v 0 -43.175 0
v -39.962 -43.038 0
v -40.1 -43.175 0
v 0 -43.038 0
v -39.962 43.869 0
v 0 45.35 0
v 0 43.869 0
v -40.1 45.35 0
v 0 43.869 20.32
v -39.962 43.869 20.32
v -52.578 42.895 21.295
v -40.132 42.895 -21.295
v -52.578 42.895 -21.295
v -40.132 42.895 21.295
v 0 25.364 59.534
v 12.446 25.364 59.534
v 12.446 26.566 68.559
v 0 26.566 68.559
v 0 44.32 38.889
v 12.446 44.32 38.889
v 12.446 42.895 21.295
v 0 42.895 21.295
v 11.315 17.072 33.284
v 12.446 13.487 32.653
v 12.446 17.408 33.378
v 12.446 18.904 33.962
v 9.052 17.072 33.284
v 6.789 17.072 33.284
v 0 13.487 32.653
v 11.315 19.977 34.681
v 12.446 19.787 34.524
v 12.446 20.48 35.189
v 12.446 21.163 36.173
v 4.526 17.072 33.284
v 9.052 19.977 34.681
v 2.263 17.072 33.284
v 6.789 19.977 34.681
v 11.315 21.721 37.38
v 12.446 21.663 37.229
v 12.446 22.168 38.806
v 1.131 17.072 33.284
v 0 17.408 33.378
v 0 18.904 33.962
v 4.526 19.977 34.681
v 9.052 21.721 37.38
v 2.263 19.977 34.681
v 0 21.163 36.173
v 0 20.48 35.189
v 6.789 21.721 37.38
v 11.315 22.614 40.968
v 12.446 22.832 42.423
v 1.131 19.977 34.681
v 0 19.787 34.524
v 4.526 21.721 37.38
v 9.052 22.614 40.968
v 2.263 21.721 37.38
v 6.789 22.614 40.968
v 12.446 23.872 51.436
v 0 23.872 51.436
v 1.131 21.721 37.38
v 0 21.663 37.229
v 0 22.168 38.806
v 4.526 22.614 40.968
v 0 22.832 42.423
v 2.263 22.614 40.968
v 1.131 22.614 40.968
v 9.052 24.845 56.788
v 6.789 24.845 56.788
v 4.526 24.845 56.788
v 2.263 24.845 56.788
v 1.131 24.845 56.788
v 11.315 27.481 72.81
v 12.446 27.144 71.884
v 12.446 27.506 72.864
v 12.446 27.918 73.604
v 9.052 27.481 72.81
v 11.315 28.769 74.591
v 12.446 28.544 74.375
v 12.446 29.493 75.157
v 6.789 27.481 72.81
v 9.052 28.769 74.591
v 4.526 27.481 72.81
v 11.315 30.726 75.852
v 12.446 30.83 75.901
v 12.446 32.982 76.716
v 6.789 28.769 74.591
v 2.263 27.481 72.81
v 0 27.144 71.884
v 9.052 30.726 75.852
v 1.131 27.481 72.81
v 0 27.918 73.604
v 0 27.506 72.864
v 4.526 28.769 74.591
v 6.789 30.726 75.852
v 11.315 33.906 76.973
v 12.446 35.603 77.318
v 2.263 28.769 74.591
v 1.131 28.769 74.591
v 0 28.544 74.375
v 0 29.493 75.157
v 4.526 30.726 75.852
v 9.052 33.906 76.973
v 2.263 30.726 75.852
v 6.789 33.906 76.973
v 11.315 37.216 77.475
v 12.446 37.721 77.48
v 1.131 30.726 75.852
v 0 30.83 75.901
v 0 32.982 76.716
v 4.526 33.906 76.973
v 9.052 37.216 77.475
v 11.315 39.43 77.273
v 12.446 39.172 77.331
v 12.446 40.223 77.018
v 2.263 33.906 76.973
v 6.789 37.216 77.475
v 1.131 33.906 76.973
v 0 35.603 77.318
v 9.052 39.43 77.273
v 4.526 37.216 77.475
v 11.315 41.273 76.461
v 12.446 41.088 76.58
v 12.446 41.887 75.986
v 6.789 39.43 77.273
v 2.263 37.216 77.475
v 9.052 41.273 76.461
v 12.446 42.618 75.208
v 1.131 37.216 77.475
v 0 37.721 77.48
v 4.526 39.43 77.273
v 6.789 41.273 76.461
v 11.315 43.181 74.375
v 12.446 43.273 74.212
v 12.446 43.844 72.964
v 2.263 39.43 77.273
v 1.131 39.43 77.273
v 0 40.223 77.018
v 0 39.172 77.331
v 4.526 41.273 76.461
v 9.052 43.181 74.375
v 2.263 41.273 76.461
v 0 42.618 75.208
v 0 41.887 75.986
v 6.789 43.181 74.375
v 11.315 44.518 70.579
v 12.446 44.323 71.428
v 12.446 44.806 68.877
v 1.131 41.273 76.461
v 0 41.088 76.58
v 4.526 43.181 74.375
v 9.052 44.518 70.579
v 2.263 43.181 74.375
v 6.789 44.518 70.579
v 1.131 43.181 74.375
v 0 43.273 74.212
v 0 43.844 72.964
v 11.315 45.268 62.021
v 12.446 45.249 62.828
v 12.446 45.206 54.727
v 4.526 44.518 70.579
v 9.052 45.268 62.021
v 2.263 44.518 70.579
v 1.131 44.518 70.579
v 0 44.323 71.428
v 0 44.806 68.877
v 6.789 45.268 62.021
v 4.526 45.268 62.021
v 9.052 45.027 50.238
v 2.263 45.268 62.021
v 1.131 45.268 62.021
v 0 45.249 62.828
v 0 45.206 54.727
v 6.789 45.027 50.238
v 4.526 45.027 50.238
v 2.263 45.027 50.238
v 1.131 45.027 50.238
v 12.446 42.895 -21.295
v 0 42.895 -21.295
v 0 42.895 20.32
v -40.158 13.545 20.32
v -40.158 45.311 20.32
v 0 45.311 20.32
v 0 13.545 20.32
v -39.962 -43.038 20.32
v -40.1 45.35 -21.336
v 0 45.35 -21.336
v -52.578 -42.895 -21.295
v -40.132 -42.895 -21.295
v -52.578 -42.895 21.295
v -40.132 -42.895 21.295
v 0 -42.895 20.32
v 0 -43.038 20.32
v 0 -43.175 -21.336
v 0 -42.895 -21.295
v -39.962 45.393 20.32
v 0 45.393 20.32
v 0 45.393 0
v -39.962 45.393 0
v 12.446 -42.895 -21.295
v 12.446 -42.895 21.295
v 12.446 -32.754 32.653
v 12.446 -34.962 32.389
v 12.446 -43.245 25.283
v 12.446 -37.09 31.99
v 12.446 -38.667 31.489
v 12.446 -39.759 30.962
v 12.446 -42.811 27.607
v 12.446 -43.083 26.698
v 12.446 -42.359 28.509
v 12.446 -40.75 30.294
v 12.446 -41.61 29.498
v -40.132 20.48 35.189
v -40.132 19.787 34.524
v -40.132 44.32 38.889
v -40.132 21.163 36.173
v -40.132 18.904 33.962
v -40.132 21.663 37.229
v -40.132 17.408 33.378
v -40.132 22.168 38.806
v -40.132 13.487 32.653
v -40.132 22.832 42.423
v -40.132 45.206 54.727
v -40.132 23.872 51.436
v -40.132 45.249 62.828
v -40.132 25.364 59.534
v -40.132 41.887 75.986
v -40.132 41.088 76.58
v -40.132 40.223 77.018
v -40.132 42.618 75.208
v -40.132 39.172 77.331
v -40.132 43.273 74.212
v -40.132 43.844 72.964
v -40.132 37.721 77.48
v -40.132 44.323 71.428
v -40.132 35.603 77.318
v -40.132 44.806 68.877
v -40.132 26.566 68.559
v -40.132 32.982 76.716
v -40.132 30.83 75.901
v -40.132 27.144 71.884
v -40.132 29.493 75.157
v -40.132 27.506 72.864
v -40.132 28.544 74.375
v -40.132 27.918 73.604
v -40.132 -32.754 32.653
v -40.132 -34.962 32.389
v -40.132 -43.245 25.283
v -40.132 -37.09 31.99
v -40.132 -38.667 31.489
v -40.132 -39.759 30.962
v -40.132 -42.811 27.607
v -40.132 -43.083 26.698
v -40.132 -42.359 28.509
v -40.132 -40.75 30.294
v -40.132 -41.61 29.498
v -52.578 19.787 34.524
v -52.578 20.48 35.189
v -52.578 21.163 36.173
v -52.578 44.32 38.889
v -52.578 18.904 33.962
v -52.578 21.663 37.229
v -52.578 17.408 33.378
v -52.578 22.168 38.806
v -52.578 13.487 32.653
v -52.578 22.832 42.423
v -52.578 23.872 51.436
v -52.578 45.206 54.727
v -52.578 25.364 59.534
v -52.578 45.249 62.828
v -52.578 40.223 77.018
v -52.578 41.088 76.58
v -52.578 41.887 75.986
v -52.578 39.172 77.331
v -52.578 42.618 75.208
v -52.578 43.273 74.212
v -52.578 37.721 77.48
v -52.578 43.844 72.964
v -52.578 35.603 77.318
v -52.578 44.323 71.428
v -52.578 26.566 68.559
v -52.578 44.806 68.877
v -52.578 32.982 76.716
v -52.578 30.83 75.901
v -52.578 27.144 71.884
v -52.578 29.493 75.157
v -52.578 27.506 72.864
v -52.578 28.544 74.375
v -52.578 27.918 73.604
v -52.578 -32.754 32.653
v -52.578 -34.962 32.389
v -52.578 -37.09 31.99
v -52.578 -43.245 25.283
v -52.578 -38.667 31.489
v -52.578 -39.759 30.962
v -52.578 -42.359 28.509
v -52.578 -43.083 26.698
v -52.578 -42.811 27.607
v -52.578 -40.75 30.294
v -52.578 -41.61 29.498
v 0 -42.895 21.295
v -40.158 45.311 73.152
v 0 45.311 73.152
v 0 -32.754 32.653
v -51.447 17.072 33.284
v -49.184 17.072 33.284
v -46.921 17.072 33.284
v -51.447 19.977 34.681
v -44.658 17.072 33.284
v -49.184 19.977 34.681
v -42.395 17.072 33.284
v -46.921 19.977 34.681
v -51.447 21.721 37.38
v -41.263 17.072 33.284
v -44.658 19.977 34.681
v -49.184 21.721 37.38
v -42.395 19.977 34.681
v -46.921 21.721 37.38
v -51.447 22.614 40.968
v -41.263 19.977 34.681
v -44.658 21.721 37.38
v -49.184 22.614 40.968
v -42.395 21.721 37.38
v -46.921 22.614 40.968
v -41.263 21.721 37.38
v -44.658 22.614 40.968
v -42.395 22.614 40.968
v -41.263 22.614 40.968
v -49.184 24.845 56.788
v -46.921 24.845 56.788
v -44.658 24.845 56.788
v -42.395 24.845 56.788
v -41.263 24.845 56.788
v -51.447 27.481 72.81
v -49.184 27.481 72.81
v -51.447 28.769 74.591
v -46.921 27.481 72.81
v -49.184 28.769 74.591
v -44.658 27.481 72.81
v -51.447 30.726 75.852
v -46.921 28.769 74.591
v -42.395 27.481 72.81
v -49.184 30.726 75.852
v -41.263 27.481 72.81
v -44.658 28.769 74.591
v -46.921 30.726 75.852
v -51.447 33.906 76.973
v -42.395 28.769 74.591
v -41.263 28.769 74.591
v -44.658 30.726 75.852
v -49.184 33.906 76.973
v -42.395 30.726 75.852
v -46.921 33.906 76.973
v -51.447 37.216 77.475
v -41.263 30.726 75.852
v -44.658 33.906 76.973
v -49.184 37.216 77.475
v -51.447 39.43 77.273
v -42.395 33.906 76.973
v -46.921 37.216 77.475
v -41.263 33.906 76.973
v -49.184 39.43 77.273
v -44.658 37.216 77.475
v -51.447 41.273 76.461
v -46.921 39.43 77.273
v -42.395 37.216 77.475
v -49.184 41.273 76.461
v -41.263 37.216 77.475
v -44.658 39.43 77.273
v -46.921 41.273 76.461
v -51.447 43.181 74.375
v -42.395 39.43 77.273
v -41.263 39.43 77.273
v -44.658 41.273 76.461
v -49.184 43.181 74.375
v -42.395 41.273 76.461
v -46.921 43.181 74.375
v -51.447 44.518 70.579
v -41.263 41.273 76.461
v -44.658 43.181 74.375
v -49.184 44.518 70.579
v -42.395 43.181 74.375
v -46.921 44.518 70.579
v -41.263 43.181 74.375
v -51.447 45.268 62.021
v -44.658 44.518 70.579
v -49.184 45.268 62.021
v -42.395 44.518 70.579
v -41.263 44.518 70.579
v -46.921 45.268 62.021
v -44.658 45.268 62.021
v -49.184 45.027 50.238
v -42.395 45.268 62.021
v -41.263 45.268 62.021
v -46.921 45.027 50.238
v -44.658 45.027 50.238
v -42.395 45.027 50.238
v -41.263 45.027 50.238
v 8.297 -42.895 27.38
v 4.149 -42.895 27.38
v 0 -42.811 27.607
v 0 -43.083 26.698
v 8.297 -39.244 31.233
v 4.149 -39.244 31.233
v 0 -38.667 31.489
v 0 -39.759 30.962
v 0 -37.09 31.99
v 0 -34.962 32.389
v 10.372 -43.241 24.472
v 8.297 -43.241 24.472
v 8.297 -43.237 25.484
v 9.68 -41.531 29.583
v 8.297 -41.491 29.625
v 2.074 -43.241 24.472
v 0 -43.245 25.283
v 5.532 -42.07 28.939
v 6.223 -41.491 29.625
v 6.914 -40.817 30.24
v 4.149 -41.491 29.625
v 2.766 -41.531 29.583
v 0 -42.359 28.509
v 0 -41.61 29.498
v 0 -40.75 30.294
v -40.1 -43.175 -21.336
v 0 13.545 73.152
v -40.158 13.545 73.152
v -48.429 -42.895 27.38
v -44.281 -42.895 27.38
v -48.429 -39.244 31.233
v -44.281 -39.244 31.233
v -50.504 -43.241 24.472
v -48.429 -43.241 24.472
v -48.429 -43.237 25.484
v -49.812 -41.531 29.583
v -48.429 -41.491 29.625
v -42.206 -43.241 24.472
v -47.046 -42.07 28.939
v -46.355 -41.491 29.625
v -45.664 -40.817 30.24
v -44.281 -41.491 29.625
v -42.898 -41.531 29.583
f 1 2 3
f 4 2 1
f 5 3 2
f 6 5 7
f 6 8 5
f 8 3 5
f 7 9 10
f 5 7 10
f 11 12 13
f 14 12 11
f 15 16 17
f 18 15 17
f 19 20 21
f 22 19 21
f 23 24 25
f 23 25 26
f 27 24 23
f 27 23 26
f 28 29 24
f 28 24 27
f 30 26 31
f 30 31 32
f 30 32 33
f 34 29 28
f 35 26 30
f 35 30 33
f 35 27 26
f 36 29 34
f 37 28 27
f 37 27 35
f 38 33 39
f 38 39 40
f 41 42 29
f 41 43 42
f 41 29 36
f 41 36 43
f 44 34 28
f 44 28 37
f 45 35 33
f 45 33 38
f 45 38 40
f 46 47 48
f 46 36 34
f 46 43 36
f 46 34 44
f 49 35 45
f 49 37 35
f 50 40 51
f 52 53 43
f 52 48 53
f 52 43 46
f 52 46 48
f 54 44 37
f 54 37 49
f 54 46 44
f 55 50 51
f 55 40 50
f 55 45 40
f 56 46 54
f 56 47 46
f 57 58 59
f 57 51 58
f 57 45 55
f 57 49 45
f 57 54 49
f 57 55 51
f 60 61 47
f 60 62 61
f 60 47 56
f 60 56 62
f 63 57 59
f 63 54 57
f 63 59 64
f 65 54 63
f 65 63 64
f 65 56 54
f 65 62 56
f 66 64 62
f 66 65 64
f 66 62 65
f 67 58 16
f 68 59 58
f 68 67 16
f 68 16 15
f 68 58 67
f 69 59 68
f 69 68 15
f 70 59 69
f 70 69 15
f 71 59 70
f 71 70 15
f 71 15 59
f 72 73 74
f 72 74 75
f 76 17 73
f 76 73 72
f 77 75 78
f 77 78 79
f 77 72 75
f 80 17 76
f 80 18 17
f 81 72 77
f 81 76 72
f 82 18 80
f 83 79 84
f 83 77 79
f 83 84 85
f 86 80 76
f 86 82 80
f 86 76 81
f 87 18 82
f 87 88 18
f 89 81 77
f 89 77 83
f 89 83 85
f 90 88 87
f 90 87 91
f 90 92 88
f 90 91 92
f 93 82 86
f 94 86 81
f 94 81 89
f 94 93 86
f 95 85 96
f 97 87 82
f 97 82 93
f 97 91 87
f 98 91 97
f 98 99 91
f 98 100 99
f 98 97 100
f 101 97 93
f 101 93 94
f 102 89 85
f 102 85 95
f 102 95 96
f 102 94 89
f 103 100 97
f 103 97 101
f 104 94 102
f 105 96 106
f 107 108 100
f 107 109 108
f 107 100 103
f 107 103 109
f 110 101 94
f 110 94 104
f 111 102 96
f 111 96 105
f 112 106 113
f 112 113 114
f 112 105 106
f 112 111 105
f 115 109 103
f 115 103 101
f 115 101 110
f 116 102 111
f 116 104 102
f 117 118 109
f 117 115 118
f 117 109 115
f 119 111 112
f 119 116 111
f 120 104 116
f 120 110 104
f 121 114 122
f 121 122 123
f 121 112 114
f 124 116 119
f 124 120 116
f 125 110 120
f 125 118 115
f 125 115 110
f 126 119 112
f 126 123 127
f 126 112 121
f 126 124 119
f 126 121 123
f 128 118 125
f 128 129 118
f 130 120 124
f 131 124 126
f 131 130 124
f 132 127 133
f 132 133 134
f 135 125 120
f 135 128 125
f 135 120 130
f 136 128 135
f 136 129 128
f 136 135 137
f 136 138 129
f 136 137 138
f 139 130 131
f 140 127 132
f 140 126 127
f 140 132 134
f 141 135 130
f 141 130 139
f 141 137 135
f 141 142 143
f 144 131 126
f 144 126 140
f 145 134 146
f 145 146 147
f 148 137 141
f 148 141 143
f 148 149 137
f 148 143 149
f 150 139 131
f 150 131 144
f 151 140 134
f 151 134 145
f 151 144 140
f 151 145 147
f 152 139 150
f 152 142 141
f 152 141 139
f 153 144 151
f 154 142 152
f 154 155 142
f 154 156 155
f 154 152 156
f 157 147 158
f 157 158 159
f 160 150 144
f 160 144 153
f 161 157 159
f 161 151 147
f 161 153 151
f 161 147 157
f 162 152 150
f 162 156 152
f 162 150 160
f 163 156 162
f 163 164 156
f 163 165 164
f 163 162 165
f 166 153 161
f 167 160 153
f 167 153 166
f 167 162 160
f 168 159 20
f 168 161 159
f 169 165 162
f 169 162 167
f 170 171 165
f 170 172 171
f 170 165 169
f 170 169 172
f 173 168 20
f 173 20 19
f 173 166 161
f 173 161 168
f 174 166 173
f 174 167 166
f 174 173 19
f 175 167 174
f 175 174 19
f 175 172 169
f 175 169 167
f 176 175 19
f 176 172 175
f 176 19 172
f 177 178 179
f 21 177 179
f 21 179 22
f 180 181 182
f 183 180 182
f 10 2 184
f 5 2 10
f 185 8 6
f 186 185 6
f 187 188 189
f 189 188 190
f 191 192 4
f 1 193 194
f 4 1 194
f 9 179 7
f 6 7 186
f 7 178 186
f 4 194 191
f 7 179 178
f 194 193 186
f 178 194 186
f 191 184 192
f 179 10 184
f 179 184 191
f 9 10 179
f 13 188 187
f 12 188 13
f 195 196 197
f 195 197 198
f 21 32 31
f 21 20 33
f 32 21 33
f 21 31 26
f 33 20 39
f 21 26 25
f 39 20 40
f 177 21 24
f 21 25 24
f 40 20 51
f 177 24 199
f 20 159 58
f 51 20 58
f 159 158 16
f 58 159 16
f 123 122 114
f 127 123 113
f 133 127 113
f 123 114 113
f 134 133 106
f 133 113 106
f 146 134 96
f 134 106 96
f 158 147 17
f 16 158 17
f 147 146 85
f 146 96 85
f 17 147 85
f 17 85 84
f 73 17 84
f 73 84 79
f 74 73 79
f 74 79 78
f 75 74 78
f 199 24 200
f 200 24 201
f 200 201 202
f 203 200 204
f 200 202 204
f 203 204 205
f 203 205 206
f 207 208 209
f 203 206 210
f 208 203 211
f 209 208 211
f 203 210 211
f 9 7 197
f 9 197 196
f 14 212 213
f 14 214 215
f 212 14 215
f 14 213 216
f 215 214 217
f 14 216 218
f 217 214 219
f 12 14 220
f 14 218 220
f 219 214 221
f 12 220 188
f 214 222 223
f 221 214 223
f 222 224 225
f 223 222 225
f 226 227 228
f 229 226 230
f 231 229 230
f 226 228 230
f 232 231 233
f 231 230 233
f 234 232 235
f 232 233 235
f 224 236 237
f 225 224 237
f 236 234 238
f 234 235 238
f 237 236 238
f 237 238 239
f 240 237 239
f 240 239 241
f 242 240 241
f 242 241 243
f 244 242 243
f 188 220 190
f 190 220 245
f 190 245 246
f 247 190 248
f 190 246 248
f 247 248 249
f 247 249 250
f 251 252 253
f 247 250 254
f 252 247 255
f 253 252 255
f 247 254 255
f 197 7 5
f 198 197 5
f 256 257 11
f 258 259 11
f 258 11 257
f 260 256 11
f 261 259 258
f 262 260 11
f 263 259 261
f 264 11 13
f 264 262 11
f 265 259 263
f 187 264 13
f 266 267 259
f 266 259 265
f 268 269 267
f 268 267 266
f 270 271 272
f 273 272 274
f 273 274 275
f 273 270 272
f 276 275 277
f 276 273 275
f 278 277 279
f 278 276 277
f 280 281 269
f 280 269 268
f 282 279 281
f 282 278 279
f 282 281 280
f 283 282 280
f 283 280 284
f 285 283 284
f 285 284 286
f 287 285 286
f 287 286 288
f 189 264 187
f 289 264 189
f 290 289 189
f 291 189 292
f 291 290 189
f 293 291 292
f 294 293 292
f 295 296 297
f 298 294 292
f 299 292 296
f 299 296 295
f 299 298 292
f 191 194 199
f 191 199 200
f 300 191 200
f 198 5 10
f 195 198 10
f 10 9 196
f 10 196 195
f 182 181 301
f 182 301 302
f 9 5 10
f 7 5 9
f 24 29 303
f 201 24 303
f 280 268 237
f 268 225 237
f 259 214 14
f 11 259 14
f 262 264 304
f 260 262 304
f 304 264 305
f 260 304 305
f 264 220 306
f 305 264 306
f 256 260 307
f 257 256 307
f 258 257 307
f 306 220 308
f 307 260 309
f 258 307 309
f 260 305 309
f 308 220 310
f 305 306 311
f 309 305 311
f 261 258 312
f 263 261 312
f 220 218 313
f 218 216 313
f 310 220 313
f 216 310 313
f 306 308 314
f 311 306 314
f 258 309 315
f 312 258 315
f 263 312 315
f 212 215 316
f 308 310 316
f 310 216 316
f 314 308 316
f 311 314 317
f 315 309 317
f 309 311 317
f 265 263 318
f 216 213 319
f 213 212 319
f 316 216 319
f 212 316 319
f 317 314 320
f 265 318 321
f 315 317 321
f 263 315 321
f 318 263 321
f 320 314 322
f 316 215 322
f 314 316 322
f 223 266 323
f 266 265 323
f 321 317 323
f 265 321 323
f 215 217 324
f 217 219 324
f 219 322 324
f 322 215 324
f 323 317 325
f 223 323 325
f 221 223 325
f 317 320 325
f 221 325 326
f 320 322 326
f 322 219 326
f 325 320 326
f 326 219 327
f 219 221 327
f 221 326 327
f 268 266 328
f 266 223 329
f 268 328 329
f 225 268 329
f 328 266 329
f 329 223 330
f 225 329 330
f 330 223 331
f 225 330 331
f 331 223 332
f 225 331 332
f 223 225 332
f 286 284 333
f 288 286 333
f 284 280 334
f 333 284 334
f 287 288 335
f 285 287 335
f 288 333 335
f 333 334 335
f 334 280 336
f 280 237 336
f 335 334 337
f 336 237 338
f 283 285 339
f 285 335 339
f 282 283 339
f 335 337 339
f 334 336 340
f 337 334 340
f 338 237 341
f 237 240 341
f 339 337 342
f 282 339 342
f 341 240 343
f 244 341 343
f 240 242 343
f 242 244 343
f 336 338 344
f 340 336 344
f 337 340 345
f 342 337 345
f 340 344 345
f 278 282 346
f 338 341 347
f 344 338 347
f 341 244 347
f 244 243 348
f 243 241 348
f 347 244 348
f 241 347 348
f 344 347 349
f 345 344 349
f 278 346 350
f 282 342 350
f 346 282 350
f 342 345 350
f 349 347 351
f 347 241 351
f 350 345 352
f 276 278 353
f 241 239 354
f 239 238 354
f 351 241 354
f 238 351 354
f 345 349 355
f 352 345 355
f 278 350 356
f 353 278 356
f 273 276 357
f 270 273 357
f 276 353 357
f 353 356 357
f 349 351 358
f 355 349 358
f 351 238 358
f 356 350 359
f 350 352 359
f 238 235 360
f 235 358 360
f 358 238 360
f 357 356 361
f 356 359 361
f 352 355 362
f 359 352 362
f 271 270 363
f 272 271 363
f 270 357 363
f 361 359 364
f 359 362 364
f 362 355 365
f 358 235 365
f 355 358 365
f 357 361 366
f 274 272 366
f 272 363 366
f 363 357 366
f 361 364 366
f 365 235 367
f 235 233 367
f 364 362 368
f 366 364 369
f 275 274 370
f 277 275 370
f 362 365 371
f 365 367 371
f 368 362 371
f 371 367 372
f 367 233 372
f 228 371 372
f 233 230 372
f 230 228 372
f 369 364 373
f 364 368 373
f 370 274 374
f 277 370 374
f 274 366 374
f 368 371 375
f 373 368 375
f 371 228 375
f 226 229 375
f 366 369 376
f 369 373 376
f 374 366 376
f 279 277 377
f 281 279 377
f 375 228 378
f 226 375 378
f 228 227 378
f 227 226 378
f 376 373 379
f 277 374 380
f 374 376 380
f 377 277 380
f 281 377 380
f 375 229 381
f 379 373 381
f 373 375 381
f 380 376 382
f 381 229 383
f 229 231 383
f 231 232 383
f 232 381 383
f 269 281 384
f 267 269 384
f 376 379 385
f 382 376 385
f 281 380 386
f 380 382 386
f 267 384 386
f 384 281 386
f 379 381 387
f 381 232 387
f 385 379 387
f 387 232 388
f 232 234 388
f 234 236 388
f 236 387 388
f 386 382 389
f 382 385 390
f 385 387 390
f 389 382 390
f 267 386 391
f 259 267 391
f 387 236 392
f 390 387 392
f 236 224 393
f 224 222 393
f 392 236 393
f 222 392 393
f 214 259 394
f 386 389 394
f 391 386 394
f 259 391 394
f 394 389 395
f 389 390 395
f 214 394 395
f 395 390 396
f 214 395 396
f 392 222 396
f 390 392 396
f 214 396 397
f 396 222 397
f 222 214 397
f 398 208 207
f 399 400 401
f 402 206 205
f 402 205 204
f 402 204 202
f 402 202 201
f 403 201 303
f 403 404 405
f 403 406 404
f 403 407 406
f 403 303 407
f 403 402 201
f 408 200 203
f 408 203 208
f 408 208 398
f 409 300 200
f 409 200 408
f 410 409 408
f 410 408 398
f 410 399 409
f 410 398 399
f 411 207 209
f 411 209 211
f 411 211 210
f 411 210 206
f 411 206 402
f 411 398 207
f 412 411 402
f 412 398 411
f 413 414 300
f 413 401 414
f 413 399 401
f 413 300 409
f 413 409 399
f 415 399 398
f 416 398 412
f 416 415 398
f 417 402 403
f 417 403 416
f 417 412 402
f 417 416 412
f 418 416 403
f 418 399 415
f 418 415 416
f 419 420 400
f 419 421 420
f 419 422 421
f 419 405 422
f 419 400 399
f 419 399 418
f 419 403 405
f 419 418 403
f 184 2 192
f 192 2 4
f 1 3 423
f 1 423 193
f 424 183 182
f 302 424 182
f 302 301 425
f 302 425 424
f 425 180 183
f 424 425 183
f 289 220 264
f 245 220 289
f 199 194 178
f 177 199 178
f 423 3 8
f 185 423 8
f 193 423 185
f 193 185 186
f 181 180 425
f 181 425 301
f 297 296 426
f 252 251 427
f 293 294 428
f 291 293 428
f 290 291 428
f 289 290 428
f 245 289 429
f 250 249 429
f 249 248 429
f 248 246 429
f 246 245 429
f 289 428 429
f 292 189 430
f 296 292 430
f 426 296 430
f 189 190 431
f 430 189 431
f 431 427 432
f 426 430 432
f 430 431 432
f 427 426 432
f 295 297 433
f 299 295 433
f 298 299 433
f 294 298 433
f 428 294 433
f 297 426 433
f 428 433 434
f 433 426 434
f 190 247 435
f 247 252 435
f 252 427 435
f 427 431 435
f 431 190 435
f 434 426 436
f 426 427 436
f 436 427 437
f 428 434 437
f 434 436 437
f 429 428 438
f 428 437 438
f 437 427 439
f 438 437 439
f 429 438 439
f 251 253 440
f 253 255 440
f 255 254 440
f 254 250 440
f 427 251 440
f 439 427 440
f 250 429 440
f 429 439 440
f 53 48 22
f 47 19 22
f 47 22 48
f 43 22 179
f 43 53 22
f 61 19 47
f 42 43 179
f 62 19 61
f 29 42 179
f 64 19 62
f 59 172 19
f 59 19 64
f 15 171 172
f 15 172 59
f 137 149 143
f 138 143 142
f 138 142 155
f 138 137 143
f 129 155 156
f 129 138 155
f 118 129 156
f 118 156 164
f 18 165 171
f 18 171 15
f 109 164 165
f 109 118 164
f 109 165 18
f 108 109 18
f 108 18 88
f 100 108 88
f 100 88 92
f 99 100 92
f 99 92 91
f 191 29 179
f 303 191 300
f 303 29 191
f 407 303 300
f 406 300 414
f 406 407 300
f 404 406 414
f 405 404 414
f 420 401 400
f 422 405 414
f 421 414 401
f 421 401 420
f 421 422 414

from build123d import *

# Parameters (mm, degrees)
F0_W      = 85.790194571
F0_H      = 42.5908714533
F1_DEPTH  = 12.446
F4_W      = 40.100261569
F4_H      = 88.5250978172
F5_DEPTH  = 21.336
F6_W      = 39.9622134864
F6_H      = 86.9070254266
F7_DEPTH  = 20.32
F8_W      = 40.1581972837
F8_H      = 31.7655205727
F9_DEPTH  = 52.832
F10_W     = 39.9622134864
F10_H     = 20.32
F11_DEPTH = 1.524


with BuildPart() as f1:
    # F0 (on Right) → F1 (new body)
    with BuildSketch(Plane.YZ):
        with BuildLine():
            add(Edge.make_bspline(
                [(-42.8950972855, 21.2954357266), (-43.2026130646, 23.4429030496), (-43.7973586419, 27.5961751085), (-39.3982548672, 31.9308816738), (-35.050246351, 32.4034685289), (-32.7544100583, 32.653003931)],
                knots=[0, 0, 0, 0, 0.3356867736, 0.6492292025, 1, 1, 1, 1], degree=3))
            Line((-42.8950972855, 21.2954357266), (42.8950972855, 21.2954357266))
            add(Edge.make_bspline(
                [(13.4871117771, 32.653003931), (15.9528122623, 32.9885431735), (20.8874975377, 33.6600685956), (22.9281107187, 41.1274908792), (23.4578516916, 49.7590309135), (24.8534879019, 56.7631325628), (26.4596082385, 65.2769325456), (26.7313125834, 73.0856987863), (30.5154405422, 76.2124638392), (37.1881548314, 77.9239590004), (41.7981016934, 76.8244445569), (46.9585052343, 69.2712327662), (44.6102747775, 41.5461731072), (42.8950972855, 21.2954357266)],
                knots=[0, 0, 0, 0, 0.0792274738, 0.1585604782, 0.2485882699, 0.3301268425, 0.4204415029, 0.5031043473, 0.567184067, 0.6457693958, 0.7078965634, 0.7866439223, 1, 1, 1, 1], degree=3))
            Line((13.4871117771, 32.653003931), (-32.7544100583, 32.653003931))
        make_face()
        Rectangle(F0_W, F0_H)
    extrude(amount=F1_DEPTH)


with BuildPart() as f3_1:
    # F3: instance of F1
    add(f1.part.mirror(Plane.YZ.offset(-20.066)))


with BuildPart() as f1_1:
    add(f1.part)

    # F4 (on Top) → F5 (join)
    with BuildSketch(Plane.XY):
        with Locations((-20.0501307845, 1.0874513537)):
            Rectangle(F4_W, F4_H)
    extrude(amount=-F5_DEPTH)

    # F6 (on Top) → F7 (join)
    with BuildSketch(Plane.XY):
        with Locations((-19.9811067432, 0.4151295871)):
            Rectangle(F6_W, F6_H)
    extrude(amount=F7_DEPTH)


with BuildPart() as f9:
    # F8 (on face) → F9 (new body)
    with BuildSketch(Plane.XY.offset(20.32)):
        with Locations((-20.0790986419, 29.4278264046)):
            Rectangle(F8_W, F8_H)
    extrude(amount=F9_DEPTH)


with BuildPart() as f11:
    # F10 (on face) → F11 (new body)
    with BuildSketch(Plane(origin=(0, 43.8686423004, 0), x_dir=(-1, 0, 0), z_dir=(0, 1, 0))):
        with Locations((19.9811067432, 10.16)):
            Rectangle(F10_W, F10_H)
    extrude(amount=F11_DEPTH)


solid = Compound([f3_1.part, f1_1.part, f9.part, f11.part])
